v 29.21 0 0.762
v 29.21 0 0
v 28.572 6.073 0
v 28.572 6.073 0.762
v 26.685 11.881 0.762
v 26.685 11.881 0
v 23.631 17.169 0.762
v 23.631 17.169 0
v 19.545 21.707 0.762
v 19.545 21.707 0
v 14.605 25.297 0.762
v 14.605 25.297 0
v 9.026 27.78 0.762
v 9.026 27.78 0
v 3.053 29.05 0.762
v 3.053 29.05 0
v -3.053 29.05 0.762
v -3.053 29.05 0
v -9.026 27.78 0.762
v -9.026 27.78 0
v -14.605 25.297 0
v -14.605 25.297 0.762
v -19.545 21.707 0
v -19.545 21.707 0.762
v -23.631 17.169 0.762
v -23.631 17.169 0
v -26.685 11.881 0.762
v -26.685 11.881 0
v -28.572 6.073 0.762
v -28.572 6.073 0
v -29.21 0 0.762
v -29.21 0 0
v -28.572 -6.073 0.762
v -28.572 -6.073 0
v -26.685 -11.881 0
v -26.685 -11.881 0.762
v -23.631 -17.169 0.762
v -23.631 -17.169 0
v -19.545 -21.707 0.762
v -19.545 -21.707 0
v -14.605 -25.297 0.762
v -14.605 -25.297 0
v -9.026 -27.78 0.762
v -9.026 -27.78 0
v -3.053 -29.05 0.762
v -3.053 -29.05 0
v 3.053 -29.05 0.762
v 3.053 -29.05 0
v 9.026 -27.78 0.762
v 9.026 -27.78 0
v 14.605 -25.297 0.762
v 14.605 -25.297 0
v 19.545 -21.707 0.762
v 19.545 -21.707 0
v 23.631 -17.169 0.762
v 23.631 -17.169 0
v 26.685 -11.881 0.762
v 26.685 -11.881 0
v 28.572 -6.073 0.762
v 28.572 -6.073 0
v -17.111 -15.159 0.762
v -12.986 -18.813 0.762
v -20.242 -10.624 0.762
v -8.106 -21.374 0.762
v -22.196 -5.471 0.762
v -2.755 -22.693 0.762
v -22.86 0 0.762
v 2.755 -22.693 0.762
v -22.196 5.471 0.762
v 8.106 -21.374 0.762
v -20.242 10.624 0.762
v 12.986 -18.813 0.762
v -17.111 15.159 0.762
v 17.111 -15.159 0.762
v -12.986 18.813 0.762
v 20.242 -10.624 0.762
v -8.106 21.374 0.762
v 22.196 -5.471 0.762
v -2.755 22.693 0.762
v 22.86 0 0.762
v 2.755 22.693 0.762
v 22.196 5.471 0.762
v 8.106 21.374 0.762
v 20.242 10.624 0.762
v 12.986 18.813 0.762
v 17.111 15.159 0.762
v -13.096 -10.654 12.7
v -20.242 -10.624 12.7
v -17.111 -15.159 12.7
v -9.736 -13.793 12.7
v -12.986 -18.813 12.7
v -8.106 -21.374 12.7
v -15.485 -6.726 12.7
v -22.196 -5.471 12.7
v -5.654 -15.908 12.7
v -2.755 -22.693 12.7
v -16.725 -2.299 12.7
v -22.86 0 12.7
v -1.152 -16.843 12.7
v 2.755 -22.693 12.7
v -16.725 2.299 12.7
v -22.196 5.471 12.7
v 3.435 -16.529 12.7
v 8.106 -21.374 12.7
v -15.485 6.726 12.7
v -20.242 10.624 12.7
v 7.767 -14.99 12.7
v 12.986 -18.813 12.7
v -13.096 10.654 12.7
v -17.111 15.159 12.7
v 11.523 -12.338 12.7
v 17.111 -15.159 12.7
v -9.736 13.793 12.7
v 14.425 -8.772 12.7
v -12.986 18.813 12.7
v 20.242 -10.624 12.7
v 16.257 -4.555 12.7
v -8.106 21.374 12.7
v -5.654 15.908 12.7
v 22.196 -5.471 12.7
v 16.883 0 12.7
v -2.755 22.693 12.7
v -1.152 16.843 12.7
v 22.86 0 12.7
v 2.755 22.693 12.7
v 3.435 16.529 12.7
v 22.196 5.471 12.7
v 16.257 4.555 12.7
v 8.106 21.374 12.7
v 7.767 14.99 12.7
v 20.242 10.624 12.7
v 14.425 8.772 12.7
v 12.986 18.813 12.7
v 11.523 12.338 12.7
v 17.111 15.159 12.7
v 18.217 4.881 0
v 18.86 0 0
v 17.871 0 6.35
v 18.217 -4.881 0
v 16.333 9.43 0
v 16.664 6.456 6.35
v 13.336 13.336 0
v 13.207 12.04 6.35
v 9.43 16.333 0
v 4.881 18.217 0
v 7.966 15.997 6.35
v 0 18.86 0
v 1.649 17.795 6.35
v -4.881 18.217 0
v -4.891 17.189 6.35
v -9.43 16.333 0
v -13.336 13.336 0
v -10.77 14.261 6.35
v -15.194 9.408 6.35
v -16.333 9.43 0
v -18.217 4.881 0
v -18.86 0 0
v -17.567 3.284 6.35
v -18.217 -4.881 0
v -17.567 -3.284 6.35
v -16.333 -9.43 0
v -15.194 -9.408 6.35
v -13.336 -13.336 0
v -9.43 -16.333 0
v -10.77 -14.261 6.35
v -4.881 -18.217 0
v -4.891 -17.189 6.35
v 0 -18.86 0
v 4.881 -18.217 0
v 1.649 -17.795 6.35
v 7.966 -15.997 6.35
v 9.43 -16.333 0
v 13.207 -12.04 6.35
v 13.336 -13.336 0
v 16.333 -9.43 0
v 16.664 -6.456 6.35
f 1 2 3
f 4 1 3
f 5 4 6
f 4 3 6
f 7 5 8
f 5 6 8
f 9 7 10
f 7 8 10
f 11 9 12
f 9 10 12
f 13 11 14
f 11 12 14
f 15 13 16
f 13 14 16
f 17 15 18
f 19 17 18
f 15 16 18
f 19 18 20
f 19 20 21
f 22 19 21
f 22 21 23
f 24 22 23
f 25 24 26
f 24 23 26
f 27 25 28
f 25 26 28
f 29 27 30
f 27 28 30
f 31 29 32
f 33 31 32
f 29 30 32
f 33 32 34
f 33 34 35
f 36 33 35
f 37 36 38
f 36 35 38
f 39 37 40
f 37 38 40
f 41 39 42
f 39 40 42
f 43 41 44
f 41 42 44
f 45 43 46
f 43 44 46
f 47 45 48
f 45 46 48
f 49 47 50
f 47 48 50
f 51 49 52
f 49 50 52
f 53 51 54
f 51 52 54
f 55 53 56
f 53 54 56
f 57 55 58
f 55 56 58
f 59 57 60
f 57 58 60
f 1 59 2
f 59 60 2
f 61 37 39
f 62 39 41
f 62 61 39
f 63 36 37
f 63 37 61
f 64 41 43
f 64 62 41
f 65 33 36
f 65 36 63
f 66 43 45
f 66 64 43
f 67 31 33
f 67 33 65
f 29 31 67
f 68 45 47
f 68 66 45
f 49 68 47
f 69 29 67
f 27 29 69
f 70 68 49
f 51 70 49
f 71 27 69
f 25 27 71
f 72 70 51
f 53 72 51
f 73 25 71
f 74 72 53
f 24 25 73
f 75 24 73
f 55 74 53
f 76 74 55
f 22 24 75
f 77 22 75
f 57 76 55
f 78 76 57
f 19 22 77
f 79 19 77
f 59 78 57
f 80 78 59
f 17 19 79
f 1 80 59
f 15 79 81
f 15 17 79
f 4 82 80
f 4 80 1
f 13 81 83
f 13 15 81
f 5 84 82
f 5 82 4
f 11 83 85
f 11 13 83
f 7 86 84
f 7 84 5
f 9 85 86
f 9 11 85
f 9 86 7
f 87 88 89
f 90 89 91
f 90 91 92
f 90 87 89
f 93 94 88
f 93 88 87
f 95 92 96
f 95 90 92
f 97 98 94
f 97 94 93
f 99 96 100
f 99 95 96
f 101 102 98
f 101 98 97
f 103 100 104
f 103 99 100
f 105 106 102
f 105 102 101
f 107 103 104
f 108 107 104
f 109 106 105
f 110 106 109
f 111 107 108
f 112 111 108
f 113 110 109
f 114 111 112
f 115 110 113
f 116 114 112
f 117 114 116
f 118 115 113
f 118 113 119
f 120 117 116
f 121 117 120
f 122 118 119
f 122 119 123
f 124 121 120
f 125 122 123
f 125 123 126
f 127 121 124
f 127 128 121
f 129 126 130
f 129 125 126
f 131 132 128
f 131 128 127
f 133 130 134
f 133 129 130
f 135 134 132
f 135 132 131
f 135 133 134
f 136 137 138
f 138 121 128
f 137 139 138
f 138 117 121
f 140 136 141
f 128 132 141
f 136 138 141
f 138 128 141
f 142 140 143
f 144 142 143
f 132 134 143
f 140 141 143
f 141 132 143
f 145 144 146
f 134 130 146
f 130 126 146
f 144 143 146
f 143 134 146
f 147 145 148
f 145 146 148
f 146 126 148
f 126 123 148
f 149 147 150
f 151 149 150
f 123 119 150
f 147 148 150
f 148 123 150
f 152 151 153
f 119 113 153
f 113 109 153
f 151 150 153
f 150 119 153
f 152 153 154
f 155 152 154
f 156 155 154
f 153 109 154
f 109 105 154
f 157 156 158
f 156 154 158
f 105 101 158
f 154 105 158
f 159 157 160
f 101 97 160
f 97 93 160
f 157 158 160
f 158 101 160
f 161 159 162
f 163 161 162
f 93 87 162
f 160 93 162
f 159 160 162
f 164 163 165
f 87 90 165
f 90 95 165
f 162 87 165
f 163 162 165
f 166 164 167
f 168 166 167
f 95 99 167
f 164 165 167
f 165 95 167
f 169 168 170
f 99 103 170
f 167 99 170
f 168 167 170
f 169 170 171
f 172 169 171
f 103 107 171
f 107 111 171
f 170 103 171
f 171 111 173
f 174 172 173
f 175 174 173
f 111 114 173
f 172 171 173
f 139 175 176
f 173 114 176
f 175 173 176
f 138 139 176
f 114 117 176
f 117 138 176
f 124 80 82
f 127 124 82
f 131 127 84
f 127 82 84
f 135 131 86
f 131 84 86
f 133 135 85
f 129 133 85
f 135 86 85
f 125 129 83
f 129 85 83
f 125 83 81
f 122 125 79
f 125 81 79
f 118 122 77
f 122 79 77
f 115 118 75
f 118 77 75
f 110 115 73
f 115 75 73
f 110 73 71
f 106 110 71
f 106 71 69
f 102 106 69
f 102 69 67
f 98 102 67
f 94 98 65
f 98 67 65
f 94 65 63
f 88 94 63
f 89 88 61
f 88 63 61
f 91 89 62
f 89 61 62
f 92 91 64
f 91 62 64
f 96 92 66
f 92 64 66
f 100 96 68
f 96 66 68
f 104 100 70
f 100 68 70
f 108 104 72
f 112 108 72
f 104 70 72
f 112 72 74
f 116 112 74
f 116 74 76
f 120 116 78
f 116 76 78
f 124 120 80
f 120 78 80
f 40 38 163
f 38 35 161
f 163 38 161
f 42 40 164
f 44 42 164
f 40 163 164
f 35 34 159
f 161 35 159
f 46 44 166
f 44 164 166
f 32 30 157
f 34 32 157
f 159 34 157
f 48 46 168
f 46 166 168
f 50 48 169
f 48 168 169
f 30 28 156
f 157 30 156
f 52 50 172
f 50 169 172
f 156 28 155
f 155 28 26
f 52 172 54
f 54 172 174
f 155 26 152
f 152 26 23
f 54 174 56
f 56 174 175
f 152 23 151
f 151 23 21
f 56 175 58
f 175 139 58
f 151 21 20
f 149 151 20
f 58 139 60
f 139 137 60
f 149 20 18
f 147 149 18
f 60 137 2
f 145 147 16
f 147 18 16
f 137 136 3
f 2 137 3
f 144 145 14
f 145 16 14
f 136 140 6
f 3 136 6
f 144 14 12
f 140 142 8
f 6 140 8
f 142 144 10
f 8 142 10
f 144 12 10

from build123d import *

# Parameters (mm, degrees)
F0_R     = 29.21
F1_DEPTH = 0.762
F2_R     = 22.86
F3_DEPTH = 11.938


with BuildPart() as f1:
    # F0 (on Top) → F1 (new body)
    with BuildSketch(Plane.XY):
        Circle(F0_R)
    extrude(amount=F1_DEPTH)

    # F2 (on face) → F3 (join)
    with BuildSketch(Plane.XY.offset(0.762)):
        Circle(F2_R)
    extrude(amount=F3_DEPTH)

    # F4 (on Front) → F5 (revolve, cut)
    with BuildSketch(Plane.XZ):
        Polygon((0, 39.243), (0, 0), (18.8595, 0), (12.7508, 39.243), align=None)
    revolve(axis=Axis((0, 0, 19.6215), (0, 0, 1)), mode=Mode.SUBTRACT)


solid = f1.part
